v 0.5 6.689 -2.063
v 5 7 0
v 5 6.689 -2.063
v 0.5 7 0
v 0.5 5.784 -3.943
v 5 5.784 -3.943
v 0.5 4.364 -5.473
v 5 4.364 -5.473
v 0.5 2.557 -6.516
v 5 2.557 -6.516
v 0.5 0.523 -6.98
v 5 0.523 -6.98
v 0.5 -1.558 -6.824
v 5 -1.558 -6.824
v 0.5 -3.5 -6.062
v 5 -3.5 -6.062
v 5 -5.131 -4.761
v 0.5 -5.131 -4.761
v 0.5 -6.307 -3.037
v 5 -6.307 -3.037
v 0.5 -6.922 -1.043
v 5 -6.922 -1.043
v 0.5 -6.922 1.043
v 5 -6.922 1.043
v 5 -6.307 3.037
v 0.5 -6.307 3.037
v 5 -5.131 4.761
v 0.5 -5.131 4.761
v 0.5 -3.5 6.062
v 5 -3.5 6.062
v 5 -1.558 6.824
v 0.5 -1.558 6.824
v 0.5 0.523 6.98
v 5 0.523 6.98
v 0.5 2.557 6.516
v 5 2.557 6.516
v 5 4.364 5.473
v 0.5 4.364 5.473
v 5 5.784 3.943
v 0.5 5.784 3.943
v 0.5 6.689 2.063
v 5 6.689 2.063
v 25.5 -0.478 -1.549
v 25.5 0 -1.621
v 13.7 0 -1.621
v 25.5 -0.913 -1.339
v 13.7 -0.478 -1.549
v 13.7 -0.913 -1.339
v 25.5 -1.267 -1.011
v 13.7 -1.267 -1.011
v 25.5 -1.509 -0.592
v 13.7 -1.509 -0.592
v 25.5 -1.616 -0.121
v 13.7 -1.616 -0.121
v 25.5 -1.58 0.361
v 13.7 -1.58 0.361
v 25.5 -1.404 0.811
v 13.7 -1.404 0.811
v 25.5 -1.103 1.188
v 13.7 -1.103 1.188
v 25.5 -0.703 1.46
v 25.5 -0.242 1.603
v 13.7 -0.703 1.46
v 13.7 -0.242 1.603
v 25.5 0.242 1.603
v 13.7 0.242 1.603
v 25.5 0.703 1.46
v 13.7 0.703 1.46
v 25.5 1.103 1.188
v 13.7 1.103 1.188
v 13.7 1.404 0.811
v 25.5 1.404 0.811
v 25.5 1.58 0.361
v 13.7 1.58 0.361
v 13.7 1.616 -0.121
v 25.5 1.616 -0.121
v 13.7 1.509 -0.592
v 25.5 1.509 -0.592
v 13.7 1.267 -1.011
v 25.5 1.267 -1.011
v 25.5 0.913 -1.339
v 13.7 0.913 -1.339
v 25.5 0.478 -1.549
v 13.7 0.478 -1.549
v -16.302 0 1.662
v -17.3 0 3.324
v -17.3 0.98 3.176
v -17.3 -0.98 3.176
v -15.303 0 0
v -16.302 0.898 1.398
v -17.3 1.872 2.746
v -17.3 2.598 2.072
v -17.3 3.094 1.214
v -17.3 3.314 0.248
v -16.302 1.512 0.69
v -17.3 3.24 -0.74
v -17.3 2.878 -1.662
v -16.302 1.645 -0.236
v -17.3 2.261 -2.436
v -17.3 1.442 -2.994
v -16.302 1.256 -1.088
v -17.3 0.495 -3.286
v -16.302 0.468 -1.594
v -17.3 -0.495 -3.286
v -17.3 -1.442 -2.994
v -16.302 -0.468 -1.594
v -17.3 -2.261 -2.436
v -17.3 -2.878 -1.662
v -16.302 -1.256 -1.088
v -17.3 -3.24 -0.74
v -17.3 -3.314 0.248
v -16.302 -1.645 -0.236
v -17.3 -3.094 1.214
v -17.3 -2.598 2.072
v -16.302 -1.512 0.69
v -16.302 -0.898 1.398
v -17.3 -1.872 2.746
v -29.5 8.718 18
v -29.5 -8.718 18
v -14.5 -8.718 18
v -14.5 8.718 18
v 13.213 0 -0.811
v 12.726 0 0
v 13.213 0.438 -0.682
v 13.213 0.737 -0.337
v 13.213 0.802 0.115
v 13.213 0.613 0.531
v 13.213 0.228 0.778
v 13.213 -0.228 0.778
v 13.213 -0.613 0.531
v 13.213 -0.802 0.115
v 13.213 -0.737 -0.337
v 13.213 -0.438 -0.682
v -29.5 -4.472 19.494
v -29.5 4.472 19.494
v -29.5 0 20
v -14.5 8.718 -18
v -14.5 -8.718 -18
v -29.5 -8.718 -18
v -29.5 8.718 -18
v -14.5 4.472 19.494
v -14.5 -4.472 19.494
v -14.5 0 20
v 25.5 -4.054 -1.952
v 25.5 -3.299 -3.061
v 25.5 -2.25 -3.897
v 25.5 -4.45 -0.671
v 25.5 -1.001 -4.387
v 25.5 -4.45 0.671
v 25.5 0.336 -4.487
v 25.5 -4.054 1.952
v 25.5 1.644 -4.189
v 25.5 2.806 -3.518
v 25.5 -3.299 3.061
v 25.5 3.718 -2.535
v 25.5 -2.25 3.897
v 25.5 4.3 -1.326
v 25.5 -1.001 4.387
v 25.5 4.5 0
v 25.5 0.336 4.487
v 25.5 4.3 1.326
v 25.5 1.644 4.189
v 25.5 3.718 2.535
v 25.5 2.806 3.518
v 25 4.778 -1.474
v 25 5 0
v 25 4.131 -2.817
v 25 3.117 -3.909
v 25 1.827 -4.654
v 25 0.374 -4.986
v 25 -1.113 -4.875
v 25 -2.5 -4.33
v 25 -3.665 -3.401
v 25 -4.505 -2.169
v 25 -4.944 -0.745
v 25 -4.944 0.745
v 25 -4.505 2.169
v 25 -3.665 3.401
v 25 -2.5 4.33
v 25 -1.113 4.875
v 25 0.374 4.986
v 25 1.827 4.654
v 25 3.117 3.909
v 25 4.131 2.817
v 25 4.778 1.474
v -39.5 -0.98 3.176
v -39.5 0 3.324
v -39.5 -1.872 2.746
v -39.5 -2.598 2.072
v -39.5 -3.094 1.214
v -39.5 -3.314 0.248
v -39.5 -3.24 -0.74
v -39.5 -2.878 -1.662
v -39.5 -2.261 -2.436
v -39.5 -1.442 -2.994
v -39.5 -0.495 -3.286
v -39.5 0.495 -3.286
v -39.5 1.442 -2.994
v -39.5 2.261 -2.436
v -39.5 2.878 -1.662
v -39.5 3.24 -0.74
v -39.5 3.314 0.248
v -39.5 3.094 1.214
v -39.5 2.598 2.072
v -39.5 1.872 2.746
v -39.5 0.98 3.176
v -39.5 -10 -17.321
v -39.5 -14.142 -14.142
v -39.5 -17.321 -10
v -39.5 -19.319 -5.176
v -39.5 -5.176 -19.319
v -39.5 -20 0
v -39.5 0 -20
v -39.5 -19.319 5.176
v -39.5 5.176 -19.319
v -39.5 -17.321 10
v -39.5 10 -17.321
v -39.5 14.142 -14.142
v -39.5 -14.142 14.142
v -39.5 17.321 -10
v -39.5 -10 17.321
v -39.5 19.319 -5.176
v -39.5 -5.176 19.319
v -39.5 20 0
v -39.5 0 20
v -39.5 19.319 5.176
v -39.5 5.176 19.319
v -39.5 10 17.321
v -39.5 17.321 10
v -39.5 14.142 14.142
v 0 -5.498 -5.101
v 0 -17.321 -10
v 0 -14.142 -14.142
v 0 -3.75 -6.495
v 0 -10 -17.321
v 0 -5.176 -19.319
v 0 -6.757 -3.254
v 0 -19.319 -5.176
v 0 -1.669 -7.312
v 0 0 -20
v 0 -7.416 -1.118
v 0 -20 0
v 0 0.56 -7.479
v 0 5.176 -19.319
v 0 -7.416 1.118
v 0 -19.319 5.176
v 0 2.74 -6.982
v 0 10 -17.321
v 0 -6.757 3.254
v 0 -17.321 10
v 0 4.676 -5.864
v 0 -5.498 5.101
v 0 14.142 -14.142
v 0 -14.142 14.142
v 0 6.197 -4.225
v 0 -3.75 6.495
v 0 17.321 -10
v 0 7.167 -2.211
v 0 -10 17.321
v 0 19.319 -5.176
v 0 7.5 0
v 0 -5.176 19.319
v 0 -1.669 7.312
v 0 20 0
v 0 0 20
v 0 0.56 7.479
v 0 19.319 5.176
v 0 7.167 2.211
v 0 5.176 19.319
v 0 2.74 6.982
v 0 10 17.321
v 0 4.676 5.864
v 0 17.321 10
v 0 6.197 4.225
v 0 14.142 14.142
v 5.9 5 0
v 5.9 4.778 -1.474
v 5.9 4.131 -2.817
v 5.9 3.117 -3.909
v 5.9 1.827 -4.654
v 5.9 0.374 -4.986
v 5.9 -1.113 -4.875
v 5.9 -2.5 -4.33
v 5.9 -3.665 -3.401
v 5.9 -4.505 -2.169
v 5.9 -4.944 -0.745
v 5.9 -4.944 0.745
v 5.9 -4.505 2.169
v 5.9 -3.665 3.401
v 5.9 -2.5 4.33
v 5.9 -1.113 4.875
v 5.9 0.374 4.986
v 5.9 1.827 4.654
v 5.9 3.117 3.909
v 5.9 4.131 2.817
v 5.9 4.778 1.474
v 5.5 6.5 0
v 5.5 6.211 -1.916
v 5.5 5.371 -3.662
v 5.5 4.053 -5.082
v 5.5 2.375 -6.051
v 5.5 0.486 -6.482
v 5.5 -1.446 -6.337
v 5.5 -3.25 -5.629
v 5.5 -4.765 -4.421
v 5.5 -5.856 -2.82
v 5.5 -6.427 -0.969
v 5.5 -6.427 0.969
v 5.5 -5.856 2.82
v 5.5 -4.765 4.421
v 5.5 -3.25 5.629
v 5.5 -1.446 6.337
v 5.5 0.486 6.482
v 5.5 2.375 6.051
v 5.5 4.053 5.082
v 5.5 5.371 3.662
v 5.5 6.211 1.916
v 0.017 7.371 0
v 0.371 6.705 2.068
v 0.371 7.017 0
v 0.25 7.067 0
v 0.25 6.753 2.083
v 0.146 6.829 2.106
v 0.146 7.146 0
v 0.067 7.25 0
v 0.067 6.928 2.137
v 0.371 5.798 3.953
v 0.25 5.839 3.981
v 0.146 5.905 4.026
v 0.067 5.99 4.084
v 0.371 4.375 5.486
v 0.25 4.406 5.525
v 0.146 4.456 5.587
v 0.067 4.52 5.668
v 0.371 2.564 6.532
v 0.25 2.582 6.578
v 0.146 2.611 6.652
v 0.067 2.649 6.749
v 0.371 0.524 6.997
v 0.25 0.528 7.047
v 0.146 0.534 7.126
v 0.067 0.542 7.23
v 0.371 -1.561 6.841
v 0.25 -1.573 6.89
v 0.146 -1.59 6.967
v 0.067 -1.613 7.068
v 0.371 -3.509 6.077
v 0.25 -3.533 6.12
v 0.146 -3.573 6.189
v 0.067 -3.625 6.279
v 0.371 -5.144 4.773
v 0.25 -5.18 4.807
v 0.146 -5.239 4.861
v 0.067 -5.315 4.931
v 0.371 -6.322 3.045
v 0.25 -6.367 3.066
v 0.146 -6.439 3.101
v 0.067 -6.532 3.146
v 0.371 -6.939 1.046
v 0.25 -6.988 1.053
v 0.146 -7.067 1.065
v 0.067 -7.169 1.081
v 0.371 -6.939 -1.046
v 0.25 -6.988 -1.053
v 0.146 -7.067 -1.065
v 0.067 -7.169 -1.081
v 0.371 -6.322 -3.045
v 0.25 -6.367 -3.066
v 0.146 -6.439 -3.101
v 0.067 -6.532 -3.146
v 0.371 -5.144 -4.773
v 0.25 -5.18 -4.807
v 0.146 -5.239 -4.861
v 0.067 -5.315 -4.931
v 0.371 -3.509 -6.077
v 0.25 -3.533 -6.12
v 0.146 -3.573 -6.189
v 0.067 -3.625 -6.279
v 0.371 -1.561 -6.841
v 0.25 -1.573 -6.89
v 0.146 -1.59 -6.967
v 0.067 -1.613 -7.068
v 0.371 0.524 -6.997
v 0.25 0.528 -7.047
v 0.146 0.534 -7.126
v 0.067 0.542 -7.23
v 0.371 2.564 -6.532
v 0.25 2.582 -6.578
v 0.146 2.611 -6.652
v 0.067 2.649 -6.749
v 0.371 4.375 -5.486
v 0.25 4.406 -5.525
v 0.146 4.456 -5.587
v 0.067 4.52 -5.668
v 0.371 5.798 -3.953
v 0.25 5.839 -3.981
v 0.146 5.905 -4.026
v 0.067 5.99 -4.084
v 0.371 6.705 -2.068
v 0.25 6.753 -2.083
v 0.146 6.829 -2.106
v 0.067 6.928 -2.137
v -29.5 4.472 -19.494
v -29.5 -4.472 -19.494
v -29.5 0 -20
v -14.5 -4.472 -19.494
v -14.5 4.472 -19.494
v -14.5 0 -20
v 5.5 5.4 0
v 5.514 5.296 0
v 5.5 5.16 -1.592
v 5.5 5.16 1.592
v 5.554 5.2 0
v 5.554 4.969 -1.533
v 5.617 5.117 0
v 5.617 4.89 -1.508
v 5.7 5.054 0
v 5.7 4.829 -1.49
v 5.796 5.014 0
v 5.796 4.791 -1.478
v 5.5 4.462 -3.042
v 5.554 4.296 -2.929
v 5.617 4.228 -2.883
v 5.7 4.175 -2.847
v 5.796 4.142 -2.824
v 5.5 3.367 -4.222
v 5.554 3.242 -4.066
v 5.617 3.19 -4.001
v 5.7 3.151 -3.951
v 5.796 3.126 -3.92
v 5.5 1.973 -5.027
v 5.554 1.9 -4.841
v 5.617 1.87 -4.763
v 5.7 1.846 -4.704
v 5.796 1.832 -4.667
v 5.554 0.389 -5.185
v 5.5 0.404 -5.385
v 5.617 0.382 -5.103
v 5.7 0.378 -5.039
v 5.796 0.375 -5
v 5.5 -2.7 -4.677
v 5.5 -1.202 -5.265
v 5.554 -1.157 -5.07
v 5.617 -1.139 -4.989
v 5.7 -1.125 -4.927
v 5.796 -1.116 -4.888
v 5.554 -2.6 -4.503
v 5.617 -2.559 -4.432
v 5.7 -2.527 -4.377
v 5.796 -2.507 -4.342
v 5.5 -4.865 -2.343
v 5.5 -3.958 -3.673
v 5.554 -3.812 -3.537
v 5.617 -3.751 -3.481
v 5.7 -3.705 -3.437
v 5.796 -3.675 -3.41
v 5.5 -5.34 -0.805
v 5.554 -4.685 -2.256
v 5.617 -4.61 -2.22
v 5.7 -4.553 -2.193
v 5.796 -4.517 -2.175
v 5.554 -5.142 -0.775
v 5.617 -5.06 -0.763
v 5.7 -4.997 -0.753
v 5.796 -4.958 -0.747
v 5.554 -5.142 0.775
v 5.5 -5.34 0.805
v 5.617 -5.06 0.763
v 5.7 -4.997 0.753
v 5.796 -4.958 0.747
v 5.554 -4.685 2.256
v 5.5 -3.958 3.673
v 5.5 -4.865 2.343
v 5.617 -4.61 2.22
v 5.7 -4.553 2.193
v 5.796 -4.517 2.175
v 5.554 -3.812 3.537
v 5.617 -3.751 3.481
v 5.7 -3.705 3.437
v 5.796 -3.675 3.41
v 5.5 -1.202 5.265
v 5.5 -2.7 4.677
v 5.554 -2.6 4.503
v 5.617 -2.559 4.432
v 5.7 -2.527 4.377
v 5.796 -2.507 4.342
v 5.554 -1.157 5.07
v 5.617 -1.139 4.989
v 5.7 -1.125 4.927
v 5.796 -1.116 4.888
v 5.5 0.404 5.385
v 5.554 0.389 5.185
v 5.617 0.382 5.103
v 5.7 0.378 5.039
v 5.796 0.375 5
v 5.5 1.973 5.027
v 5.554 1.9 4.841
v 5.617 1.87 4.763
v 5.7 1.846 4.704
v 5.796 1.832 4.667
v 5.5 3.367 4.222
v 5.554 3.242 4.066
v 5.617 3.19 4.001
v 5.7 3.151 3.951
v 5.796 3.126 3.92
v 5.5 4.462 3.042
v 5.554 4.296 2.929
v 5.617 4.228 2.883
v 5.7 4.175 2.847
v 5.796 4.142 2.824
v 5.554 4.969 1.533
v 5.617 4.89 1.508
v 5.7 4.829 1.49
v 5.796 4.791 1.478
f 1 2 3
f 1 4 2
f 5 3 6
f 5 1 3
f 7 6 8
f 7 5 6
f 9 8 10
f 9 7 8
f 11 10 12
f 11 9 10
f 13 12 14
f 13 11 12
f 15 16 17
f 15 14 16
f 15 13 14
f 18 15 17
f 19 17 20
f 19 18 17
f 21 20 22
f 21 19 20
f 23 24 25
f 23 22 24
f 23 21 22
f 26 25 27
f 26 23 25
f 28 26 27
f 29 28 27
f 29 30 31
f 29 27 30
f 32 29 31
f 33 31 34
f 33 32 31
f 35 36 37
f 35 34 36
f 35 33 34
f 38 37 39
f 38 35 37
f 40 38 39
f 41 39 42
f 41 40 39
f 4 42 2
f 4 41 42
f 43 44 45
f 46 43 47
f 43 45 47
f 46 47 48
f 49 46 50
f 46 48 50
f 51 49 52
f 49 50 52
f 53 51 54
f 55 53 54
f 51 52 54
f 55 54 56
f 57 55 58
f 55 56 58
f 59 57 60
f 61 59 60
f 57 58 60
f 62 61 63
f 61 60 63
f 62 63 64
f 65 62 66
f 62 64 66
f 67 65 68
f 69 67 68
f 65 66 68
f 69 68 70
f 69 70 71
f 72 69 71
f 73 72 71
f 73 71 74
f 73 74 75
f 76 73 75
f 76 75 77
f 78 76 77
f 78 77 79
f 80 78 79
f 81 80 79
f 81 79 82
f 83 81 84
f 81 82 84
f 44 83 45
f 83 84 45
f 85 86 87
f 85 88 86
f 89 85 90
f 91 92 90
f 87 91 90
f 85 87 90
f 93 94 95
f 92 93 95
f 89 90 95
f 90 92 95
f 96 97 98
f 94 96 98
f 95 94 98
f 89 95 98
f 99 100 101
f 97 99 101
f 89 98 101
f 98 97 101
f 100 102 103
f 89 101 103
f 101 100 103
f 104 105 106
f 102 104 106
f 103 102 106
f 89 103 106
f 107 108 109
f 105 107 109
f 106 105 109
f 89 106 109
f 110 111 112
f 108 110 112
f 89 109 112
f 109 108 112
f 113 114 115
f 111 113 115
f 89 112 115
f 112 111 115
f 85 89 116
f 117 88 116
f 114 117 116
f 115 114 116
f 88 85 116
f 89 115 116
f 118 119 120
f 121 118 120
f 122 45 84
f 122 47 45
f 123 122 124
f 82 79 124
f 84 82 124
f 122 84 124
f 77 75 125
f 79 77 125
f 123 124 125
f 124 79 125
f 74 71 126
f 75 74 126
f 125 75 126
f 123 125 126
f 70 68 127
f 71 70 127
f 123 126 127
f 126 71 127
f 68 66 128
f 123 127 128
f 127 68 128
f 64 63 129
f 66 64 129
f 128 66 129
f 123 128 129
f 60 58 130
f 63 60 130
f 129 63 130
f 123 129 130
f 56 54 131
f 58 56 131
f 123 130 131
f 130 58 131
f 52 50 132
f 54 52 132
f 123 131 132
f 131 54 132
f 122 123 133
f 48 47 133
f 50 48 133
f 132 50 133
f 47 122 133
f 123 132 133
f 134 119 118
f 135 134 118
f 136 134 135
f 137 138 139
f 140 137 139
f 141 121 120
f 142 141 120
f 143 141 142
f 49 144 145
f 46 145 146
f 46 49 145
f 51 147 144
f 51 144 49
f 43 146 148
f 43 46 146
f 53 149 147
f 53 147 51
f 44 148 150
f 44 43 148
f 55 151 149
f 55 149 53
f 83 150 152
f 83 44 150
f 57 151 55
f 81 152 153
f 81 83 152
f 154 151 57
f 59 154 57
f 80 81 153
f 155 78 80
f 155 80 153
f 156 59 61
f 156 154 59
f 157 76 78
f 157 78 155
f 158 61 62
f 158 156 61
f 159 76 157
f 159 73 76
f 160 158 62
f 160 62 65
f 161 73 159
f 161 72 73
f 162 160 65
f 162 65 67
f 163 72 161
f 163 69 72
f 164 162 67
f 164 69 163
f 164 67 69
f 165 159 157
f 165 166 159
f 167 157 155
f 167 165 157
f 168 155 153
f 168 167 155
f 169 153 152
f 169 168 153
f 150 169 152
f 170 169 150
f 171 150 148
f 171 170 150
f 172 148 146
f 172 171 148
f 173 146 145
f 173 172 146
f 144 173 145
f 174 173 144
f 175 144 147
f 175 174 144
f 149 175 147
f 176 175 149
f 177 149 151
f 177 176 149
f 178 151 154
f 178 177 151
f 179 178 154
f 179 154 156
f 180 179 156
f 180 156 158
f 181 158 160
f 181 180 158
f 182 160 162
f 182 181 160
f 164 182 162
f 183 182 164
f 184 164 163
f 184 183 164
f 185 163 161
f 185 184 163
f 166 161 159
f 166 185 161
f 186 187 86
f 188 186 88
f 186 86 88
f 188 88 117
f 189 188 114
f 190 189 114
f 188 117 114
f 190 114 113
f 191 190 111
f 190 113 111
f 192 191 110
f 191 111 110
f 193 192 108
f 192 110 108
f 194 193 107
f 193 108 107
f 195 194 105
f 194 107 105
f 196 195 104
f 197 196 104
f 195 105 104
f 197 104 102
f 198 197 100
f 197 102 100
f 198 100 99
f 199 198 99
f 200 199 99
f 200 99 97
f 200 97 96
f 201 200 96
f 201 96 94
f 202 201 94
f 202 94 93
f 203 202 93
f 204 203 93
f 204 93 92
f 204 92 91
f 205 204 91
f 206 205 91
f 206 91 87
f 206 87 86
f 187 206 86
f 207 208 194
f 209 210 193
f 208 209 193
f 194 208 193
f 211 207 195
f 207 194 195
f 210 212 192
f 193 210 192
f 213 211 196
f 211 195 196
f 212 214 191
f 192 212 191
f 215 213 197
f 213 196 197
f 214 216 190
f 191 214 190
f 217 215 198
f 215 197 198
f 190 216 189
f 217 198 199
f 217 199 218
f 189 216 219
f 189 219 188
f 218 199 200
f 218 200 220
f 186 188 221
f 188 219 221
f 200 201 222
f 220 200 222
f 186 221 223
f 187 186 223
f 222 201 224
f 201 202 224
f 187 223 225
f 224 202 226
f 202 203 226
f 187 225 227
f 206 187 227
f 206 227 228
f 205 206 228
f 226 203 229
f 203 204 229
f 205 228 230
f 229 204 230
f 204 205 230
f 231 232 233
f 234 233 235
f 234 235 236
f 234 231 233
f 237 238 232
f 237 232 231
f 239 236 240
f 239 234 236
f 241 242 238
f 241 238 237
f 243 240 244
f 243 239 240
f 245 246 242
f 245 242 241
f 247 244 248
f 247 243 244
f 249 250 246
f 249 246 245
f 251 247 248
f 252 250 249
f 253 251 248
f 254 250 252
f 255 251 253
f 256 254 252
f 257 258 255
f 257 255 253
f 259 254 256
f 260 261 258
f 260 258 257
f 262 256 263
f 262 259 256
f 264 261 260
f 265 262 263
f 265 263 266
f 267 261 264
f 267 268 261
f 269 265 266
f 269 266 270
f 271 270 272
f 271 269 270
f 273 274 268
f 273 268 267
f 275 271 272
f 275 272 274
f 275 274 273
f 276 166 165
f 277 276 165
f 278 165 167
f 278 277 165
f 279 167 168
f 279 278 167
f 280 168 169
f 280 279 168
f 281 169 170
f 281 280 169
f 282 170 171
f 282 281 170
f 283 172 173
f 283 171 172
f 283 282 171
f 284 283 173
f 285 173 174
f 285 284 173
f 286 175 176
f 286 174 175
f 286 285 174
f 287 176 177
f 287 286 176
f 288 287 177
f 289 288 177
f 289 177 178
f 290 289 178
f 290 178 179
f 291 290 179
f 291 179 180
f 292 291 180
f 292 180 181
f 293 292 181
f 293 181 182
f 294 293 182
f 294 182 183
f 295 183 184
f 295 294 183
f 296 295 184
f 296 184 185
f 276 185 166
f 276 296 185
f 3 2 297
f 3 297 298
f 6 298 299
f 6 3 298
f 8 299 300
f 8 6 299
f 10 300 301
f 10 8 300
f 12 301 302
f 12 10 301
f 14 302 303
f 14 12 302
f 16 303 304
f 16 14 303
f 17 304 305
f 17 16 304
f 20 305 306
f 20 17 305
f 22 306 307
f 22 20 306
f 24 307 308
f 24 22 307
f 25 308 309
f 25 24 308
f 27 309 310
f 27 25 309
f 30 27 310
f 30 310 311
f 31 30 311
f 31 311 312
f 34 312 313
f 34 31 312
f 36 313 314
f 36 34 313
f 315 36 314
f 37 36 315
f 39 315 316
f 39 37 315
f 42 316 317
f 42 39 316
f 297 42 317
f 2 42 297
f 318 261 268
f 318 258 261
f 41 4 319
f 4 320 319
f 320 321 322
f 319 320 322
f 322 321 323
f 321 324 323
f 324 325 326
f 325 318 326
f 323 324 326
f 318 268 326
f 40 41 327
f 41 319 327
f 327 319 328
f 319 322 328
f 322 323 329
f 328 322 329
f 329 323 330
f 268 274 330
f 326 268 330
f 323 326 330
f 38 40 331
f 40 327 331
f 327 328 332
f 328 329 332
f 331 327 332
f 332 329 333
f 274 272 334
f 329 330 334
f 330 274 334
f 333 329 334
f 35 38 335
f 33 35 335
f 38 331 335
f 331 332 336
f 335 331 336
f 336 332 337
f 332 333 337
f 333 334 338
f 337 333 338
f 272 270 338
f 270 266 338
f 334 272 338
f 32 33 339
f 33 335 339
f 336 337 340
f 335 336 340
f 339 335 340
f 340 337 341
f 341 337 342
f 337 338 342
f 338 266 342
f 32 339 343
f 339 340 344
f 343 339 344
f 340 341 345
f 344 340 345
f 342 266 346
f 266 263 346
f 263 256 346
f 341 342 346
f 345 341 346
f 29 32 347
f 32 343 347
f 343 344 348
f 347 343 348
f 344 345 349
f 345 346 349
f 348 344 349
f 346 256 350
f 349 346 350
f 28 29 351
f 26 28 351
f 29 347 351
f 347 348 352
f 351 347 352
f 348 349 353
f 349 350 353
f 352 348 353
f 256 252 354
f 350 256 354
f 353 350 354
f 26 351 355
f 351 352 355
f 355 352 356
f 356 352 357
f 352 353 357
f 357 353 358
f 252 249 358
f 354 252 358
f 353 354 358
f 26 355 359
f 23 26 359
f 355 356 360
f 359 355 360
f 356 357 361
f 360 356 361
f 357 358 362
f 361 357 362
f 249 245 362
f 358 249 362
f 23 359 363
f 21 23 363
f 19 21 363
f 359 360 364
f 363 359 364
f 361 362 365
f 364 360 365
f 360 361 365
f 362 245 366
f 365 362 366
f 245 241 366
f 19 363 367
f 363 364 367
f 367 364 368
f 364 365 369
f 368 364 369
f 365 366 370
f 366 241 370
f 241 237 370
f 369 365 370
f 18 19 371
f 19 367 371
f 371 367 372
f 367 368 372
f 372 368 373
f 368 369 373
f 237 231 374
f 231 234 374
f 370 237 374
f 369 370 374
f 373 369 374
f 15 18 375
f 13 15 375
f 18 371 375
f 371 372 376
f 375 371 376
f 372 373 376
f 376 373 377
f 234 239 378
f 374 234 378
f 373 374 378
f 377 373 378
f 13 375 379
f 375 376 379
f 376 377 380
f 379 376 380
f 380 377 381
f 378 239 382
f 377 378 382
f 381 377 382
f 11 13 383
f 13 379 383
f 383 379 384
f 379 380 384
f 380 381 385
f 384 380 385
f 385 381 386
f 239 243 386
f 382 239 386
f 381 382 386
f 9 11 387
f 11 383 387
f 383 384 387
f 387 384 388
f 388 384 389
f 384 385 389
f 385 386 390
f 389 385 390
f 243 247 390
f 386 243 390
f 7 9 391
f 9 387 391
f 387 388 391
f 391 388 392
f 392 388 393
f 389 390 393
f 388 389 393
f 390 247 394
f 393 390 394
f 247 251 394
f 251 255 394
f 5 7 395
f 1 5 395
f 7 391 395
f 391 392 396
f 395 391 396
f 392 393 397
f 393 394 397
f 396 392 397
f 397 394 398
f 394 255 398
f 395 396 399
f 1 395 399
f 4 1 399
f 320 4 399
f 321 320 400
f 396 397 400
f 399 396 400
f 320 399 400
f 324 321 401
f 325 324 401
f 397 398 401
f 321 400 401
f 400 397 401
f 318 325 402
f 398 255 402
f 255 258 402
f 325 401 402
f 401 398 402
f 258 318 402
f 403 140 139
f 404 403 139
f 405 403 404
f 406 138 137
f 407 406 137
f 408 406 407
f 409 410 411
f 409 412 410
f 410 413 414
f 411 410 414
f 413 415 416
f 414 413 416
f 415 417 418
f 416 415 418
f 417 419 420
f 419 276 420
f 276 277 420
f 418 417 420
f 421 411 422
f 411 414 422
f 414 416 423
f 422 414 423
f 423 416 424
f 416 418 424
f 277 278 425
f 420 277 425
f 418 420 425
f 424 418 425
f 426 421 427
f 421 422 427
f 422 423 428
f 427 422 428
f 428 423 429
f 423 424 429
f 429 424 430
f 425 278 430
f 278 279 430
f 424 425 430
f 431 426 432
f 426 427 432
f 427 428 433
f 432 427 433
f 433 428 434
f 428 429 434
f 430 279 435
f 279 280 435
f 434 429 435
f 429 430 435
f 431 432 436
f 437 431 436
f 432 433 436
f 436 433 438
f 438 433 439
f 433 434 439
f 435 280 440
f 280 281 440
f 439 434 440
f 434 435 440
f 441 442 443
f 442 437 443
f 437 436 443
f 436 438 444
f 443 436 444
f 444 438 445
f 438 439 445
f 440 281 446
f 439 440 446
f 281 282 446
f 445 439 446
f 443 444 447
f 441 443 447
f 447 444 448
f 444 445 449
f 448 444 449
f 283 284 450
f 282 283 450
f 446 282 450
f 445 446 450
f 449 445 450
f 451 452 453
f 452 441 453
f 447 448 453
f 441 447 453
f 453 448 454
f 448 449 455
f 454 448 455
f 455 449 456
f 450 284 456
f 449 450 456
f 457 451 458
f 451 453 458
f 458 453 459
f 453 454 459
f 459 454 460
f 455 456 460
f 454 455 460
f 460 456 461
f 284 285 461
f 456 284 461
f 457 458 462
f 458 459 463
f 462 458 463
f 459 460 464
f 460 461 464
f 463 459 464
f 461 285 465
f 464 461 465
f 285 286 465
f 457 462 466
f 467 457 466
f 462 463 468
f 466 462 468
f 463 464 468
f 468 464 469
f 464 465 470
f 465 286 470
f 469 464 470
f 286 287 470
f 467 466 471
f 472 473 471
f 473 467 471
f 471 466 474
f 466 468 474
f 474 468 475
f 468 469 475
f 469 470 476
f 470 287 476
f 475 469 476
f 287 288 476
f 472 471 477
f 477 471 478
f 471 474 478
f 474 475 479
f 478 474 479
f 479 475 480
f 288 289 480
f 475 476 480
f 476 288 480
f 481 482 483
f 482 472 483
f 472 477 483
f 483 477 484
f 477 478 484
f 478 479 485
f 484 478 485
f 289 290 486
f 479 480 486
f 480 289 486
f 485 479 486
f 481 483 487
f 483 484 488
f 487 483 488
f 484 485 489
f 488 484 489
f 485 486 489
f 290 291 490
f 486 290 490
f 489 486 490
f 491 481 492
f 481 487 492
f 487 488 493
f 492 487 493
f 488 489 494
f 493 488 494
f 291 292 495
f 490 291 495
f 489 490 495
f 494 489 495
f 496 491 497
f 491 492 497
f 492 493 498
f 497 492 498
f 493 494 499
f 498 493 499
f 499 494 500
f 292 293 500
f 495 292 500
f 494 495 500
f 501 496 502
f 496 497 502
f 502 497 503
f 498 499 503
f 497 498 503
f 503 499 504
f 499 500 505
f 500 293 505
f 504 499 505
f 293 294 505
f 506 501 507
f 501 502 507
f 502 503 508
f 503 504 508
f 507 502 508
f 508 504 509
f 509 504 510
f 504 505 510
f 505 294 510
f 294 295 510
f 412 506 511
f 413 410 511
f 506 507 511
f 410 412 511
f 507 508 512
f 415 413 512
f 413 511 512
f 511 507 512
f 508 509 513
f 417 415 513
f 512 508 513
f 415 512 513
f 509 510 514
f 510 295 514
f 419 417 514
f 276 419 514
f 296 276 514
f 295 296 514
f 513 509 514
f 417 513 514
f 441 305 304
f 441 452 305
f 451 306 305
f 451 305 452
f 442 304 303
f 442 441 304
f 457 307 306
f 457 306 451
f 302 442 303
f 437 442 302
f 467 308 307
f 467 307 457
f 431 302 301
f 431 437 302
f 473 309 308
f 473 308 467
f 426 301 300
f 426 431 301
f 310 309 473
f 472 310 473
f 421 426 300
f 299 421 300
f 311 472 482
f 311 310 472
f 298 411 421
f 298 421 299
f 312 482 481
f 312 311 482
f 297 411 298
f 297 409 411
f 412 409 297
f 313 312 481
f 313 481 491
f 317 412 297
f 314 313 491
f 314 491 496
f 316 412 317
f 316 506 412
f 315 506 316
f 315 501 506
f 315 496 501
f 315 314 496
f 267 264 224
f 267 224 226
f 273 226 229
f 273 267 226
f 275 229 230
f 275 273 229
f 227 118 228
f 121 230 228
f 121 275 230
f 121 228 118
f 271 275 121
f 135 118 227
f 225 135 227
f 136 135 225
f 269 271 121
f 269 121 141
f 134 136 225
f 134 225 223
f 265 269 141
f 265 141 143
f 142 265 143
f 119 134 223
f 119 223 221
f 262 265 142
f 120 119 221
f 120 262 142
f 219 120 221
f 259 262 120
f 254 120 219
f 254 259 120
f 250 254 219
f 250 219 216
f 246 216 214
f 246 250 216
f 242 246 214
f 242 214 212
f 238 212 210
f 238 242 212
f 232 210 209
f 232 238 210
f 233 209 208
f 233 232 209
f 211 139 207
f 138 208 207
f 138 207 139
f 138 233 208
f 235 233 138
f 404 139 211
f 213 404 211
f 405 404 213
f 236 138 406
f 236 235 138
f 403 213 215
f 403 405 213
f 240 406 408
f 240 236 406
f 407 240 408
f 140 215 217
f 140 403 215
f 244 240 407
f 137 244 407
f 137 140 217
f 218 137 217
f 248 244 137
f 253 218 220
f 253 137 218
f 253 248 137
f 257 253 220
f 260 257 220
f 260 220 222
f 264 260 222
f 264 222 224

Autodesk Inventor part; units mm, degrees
ref_plane "YZ Plane" through (0, 0, 0) normal (1, 0, 0) x (0, 1, 0)
ref_plane "XZ Plane" through (0, 0, 0) normal (0, 1, 0) x (-1, 0, 0)
ref_plane "XY Plane" through (0, 0, 0) normal (0, 0, 1) x (1, 0, 0)
sketch "Sketch1" plane through (0, 0, 0) normal (0, 0, 1) x (1, 0, 0)
  line L0 (0, 0) -> (5.5, 0)
  line L1 (5.5, 0) -> (5.5, 7)
  line L2 (5.5, 7) -> (0, 7)
  line L3 (0, 7) -> (0, 0)
  line L4 (5.5, 0) -> (25.5, 0)
  line L5 (25.5, 0) -> (25.5, 5)
  line L6 (25.5, 5) -> (5.5, 5)
  line L7 (5.5, 5) -> (5.5, 0)
  line L8 (0, 0) -> (-39.5, 0)
  line L9 (-39.5, 0) -> (-39.5, 20)
  line L10 (-39.5, 20) -> (0, 20)
  line L11 (0, 20) -> (0, 0)
  dimension "d0" = 5.5
  dimension "d1" = 7
  dimension "d2" = 5
  dimension "d3" = 20
  dimension "d5" = 39.5
  dimension "d6" = 20
revolve "Revolution1" add sketch "Sketch1" angle 360 about axis through (5.5, 0, 0) along (1, 0, 0)
sketch "Sketch2" plane through (25.5, 0, 0) normal (1, 0, 0) x (0, 0, -1)
  point P0 (0, 0)
  point P1 (0, 0)
hole "Hole1" at (25.5, 0, 0) direction (-1, 0, 0) diameter 3.242 depth 11.8 tip angle 118 thread size "M4x0.7" class "6H" standard "ANSI Metric M Profile"
sketch "Sketch3" plane through (-39.5, 0, 0) normal (-1, 0, 0) x (0, 0, 1)
  point P0 (0, 0)
  point P1 (0, 0)
hole "Hole2" at (-39.5, 0, 0) direction (1, 0, 0) diameter 6.647 depth 22.2 tip angle 118 thread size "M8x1.25" class "6H" standard "ANSI Metric M Profile"
sketch "Sketch4" plane through (0, 0, 0) normal (0, 1, 0) x (-1, 0, 0)
  line L0 (29.5, -20) -> (14.5, -20)
  line L1 (14.5, -20) -> (14.5, -18)
  line L2 (14.5, -18) -> (29.5, -18)
  line L3 (29.5, -18) -> (29.5, -20)
  line L4 (14.5, 20) -> (29.5, 20)
  line L5 (29.5, 20) -> (29.5, 18)
  line L6 (29.5, 18) -> (14.5, 18)
  line L7 (14.5, 18) -> (14.5, 20)
  line L8 (39.5, 20) -> (39.5, -20) projected
  point P0 (0, 0)
  dimension "d21" = 15
  dimension "d22" = 36
  dimension "d23" = 2
  dimension "d24" = 2
  dimension "d25" = 10
extrude "Extrusion1" cut sketch "Sketch4" along normal through all both and the other way through all
fillet "Fillet1" radius 0.5 1 edges at (0, -7, 0)
fillet "Fillet2" radius 0.4 1 edges at (5.5, -5, 0)
chamfer "Chamfer1" distance 0.5 angle 45 1 edges at (25.5, -5, 0)
chamfer "Chamfer2" distance 0.5 angle 45 1 edges at (5.5, -7, 0)
equation "\"d23\" = d24"
properties part number "Top_Lever Shaft" material "Stainless Steel"
